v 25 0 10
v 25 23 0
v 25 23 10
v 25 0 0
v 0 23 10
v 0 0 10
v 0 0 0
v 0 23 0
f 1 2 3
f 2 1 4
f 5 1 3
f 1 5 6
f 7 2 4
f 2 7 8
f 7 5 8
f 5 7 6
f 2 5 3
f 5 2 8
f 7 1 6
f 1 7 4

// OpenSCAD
difference() {
    cube([25, 23, 10]);
    translate([]) {
    }
}
